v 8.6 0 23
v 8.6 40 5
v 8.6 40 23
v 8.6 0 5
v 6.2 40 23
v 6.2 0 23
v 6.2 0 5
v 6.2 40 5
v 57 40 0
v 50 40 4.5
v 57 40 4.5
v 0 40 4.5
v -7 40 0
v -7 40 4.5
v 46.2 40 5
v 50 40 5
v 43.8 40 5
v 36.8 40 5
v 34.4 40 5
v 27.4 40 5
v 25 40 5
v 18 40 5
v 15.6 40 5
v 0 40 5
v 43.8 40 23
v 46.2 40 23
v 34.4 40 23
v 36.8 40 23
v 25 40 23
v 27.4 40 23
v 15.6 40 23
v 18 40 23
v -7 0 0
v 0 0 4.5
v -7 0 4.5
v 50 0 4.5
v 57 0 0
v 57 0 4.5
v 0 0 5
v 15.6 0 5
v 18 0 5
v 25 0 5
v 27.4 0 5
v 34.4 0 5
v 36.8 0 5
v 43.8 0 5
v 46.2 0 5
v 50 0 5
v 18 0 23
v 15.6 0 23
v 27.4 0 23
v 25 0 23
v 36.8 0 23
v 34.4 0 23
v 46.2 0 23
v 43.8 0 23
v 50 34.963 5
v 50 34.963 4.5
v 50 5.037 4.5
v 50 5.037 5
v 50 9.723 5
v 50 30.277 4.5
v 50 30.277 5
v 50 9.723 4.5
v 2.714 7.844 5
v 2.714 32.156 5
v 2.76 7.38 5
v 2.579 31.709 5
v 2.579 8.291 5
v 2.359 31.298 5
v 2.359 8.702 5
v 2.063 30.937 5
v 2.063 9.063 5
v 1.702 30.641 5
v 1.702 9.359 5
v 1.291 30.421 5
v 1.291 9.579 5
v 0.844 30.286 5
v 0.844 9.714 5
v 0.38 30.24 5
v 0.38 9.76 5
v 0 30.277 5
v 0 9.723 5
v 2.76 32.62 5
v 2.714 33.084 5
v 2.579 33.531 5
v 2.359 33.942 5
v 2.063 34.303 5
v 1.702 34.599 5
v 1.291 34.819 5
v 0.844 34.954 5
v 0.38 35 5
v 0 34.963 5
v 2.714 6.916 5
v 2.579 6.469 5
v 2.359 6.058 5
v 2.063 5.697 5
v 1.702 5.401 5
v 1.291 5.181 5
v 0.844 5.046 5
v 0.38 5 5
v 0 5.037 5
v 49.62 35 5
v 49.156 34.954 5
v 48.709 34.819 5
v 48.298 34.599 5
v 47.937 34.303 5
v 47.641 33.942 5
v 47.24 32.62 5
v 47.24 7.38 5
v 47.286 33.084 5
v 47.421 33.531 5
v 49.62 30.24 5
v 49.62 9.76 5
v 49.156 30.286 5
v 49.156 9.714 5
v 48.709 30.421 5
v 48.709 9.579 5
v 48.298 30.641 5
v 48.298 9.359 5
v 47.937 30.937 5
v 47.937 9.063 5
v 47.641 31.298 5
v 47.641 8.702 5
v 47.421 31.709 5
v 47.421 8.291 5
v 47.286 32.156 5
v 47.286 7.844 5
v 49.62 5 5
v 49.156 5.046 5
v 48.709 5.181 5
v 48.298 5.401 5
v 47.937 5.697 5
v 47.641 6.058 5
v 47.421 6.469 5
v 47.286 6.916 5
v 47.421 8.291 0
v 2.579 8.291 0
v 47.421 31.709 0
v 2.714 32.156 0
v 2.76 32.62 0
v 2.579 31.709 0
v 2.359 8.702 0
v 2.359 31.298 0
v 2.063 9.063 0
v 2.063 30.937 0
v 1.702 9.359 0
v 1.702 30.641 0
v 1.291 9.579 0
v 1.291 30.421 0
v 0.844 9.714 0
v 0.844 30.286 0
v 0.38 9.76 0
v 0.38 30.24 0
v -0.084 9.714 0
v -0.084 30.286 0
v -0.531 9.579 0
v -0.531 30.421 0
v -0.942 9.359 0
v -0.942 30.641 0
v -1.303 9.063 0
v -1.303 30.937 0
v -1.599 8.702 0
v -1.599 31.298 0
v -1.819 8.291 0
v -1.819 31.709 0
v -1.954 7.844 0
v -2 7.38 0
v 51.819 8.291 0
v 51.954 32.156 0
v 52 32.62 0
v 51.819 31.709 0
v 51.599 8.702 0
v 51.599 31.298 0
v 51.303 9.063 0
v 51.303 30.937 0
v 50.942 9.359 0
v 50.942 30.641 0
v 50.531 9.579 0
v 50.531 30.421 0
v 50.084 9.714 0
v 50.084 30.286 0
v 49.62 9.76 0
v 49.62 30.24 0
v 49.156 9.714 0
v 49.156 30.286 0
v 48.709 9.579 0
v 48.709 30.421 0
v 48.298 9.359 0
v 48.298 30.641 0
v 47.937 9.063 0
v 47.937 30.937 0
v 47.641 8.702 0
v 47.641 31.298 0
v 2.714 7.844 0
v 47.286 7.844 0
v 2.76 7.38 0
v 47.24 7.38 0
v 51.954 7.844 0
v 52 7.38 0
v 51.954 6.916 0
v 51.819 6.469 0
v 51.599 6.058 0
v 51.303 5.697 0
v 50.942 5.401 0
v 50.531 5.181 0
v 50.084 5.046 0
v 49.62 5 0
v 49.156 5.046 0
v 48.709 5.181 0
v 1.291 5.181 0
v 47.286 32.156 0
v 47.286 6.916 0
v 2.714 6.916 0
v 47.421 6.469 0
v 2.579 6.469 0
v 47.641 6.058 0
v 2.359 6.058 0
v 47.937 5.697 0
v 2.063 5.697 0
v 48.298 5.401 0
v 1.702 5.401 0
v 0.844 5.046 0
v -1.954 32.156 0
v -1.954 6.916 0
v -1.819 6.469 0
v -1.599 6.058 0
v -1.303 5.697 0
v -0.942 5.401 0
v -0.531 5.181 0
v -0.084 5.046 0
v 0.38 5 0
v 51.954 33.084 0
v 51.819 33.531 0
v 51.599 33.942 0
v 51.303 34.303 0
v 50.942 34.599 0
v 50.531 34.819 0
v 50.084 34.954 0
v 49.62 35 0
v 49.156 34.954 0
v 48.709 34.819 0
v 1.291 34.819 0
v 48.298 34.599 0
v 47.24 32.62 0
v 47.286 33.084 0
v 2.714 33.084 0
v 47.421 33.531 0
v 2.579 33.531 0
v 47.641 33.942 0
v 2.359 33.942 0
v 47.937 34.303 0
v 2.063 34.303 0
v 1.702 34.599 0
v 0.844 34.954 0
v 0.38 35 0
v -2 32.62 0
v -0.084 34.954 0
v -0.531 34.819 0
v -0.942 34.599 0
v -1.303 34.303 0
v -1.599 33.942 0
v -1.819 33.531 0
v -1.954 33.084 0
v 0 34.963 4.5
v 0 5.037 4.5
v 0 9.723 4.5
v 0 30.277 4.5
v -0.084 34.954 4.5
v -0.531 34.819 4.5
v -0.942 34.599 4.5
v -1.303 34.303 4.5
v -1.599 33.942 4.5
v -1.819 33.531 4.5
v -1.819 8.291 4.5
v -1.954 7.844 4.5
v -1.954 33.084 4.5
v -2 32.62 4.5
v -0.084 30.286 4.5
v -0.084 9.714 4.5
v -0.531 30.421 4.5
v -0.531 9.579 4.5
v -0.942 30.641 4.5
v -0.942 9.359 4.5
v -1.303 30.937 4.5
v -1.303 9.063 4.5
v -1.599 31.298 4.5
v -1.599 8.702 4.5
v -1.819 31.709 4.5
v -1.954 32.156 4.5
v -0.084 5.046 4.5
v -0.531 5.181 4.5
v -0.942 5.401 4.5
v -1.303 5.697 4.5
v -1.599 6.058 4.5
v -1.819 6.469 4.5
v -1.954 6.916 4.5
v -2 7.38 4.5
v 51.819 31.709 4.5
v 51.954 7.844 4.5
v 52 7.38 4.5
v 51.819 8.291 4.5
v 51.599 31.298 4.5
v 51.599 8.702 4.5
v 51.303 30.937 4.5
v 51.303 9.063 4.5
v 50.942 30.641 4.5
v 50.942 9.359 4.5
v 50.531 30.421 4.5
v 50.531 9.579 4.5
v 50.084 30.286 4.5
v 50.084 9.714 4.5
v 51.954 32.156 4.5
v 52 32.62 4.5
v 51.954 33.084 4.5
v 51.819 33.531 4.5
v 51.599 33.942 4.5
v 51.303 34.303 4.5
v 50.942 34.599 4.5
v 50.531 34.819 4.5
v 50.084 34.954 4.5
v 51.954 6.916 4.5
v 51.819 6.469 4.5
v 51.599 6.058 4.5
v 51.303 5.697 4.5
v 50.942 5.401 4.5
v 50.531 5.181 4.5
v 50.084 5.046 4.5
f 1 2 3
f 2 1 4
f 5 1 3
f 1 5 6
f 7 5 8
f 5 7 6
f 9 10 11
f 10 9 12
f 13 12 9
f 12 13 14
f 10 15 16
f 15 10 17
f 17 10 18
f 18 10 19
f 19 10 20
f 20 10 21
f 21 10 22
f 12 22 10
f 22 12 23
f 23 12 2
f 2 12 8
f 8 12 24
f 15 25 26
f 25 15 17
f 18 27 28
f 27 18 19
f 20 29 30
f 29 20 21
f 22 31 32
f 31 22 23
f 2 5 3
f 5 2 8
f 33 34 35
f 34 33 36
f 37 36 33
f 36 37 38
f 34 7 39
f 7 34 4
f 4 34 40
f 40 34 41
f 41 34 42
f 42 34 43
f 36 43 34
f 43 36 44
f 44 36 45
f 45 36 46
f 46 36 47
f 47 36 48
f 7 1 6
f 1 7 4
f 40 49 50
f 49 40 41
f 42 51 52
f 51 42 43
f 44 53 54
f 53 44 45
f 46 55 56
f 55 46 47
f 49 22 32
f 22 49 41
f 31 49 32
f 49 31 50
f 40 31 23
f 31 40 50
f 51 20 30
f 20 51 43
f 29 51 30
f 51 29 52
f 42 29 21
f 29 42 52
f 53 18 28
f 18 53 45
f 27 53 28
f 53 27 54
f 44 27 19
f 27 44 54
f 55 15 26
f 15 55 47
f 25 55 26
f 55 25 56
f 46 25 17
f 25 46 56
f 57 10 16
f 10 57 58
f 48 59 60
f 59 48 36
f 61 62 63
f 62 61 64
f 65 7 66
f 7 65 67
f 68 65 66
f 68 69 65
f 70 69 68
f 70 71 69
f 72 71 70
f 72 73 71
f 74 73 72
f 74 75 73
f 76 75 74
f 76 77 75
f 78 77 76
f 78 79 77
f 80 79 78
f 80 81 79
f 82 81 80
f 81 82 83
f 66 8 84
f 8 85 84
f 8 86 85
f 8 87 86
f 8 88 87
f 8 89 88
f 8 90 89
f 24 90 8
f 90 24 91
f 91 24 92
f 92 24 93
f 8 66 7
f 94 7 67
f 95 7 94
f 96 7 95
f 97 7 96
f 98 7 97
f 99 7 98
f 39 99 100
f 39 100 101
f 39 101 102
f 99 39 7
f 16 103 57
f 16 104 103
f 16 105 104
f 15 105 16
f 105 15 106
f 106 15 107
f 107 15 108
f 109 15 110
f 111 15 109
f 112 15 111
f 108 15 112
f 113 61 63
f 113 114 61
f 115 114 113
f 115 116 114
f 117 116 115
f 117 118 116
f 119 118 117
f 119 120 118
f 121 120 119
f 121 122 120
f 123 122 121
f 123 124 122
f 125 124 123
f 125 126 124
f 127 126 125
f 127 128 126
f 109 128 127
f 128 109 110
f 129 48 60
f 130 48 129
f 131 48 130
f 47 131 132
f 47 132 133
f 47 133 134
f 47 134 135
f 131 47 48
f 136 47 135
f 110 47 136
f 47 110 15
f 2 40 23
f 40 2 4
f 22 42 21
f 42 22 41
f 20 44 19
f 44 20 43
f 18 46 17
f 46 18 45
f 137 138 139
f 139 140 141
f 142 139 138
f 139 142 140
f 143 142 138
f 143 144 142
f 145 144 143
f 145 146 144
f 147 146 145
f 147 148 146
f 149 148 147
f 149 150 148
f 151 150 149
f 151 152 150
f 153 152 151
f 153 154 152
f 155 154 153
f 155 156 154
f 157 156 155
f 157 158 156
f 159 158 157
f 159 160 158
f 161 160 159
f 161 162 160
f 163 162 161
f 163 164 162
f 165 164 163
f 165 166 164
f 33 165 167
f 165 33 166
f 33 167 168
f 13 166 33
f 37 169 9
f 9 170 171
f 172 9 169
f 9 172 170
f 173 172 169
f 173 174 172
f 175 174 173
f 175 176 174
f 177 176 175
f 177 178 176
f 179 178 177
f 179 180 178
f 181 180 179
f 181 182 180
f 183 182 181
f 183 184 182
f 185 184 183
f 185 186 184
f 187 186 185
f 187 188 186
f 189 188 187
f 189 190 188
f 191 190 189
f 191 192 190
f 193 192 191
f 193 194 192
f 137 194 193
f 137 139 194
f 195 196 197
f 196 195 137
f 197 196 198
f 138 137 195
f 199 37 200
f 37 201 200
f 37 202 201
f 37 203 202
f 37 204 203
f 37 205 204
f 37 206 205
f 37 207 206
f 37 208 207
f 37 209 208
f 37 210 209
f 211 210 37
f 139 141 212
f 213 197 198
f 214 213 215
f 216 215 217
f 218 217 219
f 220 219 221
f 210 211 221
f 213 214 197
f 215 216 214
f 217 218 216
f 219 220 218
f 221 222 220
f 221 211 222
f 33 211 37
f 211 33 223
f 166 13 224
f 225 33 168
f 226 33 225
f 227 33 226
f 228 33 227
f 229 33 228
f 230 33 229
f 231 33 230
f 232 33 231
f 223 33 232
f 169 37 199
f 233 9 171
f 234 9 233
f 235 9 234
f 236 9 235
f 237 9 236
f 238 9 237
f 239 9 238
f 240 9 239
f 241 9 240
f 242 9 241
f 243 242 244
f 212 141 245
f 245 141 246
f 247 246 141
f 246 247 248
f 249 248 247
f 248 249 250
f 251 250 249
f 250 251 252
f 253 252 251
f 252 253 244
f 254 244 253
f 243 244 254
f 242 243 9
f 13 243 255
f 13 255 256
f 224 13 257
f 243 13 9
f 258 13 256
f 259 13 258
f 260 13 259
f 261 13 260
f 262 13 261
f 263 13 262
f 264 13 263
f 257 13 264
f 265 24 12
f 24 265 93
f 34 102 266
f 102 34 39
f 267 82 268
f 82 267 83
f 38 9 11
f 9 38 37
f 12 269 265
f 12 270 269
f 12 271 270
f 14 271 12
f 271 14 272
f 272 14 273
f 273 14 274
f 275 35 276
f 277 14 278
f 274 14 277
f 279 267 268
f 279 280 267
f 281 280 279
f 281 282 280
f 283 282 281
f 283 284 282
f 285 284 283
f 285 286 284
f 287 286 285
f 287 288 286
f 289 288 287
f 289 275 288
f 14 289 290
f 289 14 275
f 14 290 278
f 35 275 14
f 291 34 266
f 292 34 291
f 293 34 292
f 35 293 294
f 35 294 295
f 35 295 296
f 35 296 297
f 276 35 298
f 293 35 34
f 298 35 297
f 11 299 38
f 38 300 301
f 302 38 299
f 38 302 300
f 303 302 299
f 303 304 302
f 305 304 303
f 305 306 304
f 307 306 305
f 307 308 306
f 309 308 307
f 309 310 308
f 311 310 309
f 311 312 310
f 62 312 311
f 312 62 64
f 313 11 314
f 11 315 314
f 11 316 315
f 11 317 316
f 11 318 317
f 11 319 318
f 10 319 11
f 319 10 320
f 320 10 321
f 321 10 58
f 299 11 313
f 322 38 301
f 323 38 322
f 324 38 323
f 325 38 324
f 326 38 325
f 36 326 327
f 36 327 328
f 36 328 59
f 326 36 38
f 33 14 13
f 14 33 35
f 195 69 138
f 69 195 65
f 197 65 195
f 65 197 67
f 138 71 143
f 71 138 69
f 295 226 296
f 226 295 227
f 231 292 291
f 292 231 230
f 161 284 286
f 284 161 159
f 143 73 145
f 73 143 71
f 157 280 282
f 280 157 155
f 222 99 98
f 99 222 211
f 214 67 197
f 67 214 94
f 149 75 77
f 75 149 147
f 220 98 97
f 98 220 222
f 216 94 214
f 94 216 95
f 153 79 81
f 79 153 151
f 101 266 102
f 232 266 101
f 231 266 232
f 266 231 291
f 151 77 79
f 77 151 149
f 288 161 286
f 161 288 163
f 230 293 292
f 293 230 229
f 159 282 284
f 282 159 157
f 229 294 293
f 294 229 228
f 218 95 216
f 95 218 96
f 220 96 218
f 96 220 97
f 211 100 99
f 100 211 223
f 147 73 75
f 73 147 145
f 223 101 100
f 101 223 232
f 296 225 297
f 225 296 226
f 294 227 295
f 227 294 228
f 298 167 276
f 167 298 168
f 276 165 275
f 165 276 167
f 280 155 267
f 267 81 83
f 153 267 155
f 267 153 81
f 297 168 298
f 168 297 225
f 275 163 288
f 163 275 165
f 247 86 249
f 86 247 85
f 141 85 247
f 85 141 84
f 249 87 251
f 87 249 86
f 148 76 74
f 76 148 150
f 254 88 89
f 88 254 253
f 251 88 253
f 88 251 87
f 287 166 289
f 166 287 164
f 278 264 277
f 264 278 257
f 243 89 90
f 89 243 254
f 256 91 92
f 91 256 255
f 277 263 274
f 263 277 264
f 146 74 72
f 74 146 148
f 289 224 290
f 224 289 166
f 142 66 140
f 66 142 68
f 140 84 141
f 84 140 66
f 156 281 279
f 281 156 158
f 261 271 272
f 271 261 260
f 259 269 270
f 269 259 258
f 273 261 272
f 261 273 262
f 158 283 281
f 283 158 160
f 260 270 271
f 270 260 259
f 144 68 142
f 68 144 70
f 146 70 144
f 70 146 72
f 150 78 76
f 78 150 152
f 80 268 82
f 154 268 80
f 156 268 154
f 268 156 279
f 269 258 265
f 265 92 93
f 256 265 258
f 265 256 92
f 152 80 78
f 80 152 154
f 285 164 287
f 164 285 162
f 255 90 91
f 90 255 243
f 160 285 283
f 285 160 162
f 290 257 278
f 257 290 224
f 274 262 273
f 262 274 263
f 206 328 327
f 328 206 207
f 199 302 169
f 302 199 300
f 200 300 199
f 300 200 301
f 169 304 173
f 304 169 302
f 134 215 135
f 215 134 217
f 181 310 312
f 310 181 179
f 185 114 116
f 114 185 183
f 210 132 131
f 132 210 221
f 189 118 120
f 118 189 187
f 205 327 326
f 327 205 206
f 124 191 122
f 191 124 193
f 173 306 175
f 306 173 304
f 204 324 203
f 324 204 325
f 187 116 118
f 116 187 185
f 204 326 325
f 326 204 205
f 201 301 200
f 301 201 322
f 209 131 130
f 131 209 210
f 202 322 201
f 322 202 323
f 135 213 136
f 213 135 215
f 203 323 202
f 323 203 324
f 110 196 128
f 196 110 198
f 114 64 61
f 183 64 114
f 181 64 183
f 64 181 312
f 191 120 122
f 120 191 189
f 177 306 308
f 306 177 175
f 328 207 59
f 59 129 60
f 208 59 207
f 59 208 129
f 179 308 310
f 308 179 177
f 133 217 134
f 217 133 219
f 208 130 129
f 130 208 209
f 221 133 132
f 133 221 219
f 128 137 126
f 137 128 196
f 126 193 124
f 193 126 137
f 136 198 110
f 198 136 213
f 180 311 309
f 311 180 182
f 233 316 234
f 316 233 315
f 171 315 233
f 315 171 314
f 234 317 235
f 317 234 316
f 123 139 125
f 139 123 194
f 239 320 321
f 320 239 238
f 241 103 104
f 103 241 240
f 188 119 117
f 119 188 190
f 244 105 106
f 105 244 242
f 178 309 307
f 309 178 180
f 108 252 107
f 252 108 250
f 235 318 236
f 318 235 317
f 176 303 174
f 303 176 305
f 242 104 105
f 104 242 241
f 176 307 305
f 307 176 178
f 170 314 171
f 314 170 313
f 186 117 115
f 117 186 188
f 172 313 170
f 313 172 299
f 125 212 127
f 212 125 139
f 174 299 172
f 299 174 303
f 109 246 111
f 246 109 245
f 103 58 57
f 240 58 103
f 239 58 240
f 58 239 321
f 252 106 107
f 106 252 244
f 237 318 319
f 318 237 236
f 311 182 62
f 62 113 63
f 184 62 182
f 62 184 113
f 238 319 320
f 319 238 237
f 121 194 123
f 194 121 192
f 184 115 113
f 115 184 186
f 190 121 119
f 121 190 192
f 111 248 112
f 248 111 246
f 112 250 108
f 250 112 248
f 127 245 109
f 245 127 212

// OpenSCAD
$fn = 32;

// ----------------------------------------------------------------------
// Finned heat sink: 50 x 40 mm base, 18 mm fins
// ----------------------------------------------------------------------

// --- parameters (mm) ---
base_w = 50;              // base width
base_d = 40;              // base depth
base_t = 5;               // base thickness
fin_h = 18;               // fin height above the base
holes_d = 4.76;           // fixing holes
hole_x = 24.62;           // hole offset in x
hole_y = 12.62;           // hole offset in y
fin_t = 2.4;              // fin thickness
fin_pitch = 9.4;          // fin pitch
fin_count = 5;            // number of fins
fin_x0 = 6.2;             // first fin offset
flange_w = 64;            // flange plate width
flange_t = 4;             // flange plate thickness

difference() {
  union() {
    cube([base_w, base_d, base_t]);
    for (i = [0 : fin_count - 1]) {
      translate([fin_x0 + i * fin_pitch, 0, base_t - 0.5]) cube([fin_t, base_d, fin_h + 0.5]);
    }
    /* mounting flange, a wider plate sharing the base bottom */
    translate([(base_w - flange_w) / 2, 0, 0]) cube([flange_w, base_d, flange_t + 0.5]);
  }
  /* fixing holes through the base, 2.5 mm clear on both sides */
  for (hx = [-24.62, 24.62]) {
    for (hy = [-12.62, 12.62]) {
      translate([base_w / 2 + hx, base_d / 2 + hy, -2.5]) cylinder(h = base_t + 5, d = holes_d);
    }
  }
}
